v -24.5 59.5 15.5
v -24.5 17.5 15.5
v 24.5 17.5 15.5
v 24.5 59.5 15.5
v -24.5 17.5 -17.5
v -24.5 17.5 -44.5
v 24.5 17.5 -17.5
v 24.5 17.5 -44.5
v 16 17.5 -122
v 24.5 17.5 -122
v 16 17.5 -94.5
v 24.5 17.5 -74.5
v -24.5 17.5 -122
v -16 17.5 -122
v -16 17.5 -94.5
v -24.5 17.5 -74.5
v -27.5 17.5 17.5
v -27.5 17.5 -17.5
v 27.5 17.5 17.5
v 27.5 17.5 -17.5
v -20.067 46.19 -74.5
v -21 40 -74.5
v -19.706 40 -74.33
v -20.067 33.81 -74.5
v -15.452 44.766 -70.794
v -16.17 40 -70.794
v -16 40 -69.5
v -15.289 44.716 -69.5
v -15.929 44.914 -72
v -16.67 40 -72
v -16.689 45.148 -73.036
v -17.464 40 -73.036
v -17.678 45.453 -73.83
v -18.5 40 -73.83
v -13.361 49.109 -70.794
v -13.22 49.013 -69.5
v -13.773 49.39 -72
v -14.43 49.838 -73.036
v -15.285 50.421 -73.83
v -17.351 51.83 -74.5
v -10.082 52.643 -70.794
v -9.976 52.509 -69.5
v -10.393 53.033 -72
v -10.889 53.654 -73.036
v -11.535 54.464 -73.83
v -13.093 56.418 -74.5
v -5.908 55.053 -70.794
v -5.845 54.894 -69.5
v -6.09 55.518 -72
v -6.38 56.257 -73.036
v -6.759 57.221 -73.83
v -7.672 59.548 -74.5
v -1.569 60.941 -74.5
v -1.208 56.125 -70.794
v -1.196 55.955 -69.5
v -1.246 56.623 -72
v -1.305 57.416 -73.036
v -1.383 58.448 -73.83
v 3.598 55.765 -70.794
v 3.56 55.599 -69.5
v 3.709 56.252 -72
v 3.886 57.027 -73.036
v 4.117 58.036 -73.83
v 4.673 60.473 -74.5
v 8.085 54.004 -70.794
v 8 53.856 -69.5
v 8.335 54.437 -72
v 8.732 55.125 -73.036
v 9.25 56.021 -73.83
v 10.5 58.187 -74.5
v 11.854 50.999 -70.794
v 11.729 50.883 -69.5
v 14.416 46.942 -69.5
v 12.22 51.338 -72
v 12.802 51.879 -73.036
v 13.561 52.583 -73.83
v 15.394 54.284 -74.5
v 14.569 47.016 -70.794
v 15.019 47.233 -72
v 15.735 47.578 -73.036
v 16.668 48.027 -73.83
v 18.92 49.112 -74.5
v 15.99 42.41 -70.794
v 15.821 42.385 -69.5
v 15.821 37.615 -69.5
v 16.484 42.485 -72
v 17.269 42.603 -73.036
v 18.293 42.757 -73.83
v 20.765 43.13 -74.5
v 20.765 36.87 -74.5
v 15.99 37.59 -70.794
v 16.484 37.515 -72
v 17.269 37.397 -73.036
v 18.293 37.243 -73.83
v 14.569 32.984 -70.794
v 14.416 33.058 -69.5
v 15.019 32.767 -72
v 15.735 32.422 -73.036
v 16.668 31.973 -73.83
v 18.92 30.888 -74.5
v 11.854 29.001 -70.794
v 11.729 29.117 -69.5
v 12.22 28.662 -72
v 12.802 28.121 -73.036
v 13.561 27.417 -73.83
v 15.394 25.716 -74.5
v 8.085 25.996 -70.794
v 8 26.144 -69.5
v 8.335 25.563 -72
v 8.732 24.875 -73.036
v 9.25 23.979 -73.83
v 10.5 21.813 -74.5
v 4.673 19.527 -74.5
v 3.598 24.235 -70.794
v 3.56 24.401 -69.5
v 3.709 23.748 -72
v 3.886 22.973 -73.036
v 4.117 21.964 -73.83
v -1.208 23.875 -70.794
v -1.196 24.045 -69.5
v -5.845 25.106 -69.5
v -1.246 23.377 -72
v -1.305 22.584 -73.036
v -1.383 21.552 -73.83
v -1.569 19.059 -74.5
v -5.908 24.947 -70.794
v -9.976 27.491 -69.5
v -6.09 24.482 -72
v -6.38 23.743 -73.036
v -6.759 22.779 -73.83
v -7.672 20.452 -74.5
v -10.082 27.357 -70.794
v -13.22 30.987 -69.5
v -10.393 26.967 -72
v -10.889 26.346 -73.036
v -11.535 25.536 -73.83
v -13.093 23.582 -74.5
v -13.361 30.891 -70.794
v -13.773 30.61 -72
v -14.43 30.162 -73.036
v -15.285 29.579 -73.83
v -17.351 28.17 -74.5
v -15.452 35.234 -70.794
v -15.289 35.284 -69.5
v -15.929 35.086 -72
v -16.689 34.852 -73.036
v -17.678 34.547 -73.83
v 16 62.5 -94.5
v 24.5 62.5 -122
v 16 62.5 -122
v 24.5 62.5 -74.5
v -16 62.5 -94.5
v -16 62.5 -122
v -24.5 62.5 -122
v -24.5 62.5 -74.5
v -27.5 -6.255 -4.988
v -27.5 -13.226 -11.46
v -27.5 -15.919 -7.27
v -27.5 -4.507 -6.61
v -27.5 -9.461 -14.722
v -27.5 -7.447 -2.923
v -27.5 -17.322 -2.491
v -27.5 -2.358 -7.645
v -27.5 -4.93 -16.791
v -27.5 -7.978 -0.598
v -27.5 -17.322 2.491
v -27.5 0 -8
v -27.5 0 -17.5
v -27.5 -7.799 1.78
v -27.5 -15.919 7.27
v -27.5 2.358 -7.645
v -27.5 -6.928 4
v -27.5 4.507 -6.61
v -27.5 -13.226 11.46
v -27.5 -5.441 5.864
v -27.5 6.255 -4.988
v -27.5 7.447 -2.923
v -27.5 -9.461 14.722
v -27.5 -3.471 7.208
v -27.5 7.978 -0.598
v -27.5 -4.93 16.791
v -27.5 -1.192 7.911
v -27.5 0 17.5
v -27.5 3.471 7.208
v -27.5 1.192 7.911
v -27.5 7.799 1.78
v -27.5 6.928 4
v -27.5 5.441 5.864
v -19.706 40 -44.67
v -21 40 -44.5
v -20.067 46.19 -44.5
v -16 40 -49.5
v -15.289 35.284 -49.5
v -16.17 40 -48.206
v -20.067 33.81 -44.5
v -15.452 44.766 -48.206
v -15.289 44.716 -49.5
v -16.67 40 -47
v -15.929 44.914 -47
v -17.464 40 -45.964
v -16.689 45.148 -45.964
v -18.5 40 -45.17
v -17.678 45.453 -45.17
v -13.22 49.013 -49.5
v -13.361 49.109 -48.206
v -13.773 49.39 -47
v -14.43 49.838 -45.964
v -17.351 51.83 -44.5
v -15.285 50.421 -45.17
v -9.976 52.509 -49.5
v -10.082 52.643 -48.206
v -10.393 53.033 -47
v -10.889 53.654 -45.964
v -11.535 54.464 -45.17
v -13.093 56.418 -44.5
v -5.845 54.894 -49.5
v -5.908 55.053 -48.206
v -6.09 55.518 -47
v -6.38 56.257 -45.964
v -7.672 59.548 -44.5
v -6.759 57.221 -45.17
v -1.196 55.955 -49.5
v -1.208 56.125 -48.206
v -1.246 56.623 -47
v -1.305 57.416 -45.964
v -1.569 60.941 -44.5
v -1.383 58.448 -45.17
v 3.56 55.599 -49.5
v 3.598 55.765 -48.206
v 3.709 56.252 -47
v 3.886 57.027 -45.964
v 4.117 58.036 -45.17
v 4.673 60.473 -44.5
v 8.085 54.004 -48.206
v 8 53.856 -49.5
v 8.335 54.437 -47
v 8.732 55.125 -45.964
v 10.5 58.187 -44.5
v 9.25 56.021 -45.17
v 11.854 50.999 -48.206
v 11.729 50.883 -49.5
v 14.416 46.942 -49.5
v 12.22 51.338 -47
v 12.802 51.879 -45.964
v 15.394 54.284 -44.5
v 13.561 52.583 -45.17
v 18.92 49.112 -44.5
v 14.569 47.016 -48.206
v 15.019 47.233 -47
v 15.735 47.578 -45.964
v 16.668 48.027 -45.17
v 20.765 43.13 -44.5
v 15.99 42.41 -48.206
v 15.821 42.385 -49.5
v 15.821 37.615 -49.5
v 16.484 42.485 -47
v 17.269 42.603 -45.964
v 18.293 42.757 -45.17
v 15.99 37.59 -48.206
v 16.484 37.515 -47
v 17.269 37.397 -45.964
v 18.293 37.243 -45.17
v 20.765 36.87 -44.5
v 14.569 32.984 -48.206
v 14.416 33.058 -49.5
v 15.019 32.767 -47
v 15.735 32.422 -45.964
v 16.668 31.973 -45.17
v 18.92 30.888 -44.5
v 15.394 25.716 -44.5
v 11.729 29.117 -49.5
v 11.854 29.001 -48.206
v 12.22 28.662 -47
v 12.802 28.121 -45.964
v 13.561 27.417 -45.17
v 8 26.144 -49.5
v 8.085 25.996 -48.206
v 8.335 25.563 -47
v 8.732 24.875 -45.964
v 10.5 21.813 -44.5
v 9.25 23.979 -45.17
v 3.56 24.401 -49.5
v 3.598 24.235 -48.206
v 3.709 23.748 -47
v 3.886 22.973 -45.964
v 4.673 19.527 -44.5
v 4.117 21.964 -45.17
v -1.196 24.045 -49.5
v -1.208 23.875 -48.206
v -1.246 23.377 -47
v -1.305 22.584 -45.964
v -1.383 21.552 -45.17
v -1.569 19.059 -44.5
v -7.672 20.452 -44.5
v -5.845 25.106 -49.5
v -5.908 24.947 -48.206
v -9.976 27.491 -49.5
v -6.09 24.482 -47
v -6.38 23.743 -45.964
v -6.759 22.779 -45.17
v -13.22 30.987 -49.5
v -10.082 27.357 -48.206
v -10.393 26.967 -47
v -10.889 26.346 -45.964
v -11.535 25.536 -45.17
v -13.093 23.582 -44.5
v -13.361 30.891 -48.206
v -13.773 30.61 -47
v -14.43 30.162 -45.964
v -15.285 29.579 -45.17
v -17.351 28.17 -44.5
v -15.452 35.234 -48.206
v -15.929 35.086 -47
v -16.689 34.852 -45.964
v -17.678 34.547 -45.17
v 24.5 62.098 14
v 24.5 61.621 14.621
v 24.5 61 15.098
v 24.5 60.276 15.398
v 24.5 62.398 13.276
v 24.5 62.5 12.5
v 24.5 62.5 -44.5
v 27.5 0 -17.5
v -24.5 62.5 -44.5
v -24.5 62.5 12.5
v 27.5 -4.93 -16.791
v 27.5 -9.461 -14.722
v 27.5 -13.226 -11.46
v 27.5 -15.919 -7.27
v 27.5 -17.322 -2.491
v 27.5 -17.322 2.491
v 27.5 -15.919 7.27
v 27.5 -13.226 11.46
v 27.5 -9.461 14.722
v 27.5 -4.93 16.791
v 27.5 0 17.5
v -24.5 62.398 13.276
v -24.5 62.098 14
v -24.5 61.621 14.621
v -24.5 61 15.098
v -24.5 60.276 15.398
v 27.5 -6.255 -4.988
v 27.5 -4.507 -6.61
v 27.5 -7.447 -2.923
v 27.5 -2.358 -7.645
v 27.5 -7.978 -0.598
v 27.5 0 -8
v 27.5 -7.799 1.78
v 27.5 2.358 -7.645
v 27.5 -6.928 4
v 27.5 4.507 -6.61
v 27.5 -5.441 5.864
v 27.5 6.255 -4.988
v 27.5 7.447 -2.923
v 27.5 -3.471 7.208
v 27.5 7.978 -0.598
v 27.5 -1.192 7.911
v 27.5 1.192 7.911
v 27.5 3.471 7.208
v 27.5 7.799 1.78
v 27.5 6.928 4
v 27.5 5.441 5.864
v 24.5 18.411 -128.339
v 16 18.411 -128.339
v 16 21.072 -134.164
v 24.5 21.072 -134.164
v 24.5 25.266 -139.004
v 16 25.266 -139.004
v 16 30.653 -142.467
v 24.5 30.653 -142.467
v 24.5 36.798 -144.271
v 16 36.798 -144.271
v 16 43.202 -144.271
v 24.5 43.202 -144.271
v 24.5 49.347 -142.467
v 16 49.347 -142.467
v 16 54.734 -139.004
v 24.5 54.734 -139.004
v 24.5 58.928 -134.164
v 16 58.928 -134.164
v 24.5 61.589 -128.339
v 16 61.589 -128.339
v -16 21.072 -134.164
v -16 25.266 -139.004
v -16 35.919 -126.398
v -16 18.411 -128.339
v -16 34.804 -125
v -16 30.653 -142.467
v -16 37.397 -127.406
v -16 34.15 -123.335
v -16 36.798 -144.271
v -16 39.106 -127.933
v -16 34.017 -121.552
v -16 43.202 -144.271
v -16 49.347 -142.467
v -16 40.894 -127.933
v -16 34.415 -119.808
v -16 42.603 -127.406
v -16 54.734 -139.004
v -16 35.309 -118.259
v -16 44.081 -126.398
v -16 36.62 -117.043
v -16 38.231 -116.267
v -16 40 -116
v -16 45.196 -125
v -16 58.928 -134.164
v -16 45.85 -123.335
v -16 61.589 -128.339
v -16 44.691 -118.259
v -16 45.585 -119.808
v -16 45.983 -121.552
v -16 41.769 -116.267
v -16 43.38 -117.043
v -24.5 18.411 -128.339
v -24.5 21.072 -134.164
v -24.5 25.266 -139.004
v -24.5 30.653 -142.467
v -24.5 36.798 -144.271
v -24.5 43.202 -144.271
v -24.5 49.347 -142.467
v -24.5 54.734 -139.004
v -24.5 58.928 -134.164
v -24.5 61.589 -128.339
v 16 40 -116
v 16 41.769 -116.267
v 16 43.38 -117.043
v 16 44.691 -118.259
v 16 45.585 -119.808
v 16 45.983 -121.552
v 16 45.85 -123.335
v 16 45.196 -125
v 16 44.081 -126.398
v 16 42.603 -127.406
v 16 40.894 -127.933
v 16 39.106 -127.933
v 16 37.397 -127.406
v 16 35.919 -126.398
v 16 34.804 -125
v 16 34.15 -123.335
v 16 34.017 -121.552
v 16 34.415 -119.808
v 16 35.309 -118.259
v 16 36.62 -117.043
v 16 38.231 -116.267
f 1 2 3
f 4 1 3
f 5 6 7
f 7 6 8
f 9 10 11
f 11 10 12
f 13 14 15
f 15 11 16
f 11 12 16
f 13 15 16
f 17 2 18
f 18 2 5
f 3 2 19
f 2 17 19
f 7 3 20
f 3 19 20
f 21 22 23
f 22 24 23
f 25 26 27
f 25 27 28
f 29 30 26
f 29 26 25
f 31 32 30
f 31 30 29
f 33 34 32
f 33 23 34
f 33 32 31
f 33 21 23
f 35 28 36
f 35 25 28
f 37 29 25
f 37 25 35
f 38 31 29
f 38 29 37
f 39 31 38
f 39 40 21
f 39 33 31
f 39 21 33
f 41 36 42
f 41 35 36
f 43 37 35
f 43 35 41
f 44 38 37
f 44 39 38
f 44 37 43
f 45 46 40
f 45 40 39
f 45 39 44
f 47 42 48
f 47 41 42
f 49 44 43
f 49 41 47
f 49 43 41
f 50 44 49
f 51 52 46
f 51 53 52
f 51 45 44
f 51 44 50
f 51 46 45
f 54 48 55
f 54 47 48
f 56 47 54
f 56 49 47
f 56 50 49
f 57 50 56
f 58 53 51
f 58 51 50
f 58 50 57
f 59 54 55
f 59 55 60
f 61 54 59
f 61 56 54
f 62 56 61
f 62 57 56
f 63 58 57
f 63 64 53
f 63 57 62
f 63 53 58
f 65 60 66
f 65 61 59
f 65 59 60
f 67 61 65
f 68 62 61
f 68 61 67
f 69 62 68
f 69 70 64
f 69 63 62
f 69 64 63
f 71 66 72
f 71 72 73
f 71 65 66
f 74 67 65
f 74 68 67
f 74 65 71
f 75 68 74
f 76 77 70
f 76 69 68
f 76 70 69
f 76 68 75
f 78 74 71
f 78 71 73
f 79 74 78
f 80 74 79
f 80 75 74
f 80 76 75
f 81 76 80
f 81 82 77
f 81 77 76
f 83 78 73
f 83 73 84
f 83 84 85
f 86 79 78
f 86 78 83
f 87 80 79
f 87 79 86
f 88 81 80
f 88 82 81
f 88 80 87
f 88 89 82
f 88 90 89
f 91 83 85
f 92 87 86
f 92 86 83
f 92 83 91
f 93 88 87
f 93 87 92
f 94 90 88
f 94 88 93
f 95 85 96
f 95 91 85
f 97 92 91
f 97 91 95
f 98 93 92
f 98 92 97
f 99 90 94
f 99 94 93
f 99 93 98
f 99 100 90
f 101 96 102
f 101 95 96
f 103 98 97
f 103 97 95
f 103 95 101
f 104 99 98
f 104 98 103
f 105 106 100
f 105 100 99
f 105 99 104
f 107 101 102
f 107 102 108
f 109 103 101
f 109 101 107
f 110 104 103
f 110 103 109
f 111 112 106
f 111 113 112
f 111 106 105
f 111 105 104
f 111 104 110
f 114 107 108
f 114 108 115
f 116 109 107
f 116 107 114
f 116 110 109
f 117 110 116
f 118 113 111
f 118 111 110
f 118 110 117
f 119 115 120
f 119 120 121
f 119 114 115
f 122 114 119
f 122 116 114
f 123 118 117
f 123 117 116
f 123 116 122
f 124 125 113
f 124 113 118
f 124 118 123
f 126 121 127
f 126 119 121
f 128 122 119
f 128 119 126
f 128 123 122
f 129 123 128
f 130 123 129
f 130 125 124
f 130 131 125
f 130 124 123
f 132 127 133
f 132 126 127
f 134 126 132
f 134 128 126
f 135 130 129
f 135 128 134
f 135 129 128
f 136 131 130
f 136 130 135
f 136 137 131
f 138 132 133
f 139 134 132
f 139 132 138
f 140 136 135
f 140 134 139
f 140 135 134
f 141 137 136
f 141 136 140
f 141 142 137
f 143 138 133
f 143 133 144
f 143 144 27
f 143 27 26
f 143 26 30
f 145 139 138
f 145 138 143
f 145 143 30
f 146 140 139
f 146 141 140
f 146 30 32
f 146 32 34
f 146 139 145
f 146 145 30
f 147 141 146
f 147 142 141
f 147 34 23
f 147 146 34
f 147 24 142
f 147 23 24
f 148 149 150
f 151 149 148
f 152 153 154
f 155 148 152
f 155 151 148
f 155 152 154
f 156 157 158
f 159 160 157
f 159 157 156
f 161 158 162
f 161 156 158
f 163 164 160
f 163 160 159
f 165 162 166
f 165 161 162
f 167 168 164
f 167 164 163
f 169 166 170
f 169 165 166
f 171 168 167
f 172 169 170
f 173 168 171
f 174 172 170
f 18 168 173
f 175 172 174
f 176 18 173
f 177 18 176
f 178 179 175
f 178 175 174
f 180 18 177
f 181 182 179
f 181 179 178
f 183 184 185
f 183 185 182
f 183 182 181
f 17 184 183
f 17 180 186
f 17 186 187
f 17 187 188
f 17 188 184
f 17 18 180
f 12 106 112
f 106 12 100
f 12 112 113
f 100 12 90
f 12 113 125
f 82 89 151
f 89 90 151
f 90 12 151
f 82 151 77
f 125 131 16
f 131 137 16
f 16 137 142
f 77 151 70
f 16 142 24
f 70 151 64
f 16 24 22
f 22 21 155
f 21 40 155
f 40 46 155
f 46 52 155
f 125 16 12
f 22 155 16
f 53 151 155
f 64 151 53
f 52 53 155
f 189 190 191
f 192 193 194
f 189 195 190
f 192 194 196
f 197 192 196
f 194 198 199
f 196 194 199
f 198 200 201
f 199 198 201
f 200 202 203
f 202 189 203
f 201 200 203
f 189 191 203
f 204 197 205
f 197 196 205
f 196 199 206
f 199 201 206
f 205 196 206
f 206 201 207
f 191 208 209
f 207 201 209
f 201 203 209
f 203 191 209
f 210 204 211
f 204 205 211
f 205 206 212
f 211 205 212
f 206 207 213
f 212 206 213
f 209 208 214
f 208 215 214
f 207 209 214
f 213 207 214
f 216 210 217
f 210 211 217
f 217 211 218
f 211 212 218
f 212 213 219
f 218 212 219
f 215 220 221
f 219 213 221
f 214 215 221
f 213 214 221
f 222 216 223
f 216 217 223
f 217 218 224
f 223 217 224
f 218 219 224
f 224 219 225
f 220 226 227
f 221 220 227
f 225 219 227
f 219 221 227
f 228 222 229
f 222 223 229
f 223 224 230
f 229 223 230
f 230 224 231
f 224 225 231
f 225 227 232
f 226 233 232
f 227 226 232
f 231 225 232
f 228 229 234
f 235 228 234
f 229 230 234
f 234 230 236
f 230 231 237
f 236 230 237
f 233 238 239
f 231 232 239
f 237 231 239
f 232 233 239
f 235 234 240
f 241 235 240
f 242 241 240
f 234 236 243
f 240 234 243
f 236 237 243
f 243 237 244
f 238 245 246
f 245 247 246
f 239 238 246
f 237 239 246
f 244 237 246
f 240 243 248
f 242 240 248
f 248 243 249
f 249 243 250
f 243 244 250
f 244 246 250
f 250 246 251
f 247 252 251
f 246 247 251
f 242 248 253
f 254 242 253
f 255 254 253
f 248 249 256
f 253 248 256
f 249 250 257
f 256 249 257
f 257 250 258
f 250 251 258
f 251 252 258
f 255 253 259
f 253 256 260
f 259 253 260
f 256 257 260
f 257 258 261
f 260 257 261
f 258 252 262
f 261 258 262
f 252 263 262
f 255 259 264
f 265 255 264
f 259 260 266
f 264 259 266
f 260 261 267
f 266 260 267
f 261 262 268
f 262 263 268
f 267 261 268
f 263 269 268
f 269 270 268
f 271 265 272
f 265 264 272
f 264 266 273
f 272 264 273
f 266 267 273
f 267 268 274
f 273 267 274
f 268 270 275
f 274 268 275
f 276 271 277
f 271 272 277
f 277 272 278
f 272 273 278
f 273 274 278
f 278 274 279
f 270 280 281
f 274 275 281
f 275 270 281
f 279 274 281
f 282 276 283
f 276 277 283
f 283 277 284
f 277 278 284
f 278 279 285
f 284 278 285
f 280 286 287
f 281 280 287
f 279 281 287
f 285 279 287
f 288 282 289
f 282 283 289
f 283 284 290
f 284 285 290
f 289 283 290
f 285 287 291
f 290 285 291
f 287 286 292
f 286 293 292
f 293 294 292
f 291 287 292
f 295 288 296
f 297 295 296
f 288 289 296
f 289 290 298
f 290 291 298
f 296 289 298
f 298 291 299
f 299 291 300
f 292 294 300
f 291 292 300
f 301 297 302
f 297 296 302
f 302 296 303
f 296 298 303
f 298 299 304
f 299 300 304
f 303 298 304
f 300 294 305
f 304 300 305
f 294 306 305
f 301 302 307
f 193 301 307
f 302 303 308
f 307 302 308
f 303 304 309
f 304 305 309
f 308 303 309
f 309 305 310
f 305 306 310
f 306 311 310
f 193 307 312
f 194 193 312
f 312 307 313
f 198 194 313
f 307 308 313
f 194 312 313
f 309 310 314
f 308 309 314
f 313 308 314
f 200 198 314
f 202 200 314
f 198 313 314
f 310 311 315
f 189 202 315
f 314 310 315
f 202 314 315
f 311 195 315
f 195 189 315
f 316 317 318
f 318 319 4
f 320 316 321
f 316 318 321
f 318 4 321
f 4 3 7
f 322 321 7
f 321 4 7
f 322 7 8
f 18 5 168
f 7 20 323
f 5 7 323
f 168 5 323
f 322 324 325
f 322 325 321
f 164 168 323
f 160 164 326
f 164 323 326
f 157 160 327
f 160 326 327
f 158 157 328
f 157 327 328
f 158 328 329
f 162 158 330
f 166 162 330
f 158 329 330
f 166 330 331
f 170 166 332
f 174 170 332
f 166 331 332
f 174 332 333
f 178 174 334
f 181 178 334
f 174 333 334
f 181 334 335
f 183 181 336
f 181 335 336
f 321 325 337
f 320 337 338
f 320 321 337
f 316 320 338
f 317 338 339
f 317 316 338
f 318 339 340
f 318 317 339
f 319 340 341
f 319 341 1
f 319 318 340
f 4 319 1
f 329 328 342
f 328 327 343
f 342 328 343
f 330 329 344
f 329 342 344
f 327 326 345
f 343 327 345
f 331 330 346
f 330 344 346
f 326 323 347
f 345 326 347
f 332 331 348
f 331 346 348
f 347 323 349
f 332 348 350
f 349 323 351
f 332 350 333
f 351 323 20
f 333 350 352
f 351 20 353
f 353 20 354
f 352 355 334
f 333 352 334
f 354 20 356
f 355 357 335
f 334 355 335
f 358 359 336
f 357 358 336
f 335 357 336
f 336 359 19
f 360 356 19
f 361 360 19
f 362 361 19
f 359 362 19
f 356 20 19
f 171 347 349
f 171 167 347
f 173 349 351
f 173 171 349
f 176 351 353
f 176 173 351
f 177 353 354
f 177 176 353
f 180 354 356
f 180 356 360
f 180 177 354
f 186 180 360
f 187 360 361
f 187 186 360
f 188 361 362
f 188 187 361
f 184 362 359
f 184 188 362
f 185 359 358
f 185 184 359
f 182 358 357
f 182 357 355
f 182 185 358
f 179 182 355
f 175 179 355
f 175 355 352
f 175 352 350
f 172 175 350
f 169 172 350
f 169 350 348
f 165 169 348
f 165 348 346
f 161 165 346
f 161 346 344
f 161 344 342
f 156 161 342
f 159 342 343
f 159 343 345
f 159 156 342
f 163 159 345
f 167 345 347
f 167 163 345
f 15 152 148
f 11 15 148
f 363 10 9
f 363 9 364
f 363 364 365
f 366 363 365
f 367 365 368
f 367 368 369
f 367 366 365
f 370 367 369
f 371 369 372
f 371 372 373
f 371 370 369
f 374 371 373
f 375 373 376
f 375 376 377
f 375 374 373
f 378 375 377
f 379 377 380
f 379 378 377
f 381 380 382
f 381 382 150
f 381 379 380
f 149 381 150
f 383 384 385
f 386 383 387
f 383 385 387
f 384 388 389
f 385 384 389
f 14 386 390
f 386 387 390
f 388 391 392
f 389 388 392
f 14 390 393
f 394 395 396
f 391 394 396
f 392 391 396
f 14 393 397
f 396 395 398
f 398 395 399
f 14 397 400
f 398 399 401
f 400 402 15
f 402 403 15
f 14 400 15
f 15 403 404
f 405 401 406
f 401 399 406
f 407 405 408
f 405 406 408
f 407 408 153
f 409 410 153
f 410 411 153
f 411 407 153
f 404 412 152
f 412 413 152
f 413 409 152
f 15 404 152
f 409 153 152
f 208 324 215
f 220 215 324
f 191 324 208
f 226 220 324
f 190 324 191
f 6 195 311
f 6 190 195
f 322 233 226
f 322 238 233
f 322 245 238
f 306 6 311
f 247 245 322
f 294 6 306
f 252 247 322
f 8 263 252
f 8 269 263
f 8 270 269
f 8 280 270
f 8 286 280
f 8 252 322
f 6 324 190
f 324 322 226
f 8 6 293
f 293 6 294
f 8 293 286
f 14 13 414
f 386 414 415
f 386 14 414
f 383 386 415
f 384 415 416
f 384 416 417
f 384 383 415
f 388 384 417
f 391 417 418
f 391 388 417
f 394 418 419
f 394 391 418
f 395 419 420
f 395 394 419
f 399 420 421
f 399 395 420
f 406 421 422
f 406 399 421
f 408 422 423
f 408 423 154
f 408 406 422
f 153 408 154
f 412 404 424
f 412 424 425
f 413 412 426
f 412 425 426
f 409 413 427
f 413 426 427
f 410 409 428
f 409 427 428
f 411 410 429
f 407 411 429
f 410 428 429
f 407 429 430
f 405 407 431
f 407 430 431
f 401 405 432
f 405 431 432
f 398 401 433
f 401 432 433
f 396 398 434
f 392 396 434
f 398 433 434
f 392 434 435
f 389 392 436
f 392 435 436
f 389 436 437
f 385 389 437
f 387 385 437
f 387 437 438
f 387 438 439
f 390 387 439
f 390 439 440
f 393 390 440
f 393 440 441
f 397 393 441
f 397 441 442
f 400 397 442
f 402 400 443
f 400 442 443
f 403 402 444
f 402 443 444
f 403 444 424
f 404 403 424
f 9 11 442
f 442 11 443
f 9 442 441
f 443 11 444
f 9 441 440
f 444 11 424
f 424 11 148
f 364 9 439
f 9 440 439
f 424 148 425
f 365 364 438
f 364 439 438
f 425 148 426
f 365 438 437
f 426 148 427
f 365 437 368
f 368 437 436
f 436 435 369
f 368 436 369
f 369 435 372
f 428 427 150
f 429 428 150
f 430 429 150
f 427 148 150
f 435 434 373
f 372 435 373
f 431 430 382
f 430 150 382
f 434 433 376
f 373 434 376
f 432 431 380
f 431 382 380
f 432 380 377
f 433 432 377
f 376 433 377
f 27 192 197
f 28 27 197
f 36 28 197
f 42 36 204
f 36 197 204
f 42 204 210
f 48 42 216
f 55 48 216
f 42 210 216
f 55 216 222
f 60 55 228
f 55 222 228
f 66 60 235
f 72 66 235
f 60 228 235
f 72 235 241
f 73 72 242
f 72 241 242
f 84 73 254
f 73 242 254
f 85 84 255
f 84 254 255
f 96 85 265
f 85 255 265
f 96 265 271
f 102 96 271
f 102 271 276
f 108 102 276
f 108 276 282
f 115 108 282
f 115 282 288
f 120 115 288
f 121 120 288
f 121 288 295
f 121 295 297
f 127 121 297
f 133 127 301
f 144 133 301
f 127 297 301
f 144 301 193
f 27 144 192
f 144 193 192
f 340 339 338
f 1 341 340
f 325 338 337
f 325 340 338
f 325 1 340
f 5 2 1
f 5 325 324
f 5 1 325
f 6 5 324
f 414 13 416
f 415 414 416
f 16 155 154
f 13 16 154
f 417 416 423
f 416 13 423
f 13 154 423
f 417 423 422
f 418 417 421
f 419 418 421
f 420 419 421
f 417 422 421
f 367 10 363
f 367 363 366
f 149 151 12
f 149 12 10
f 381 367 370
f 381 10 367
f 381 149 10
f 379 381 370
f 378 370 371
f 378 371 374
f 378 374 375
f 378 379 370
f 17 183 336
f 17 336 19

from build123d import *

# Parameters (mm, degrees)
SKETCH1_R           = 8
BOSS_EXTRUDE1_DEPTH = 27.5
SKETCH2_W           = 49
SKETCH2_H           = 60
BOSS_EXTRUDE2_DEPTH = 45
SKETCH3_R           = 16
BOSS_EXTRUDE3_DEPTH = 30
SKETCH4_W           = 49
SKETCH4_H           = 45
BOSS_EXTRUDE4_DEPTH = 47.5
BOSS_EXTRUDE5_DEPTH = 49
SKETCH6_W           = 24.794244746
SKETCH6_H           = 50
CUT_EXTRUDE1_DEPTH  = 81
SKETCH7_R           = 6
CUT_EXTRUDE2_DEPTH  = 53
SKETCH8_R           = 6
BOSS_EXTRUDE6_DEPTH = 49
FILLET1_R           = 5
FILLET2_R           = 5
FILLET4_R           = 3
CUT_EXTRUDE4_DEPTH  = 81
SKETCH12_R          = 6
BOSS_EXTRUDE7_DEPTH = 32


with BuildPart() as part:
    # Sketch1 → Boss-Extrude1 (new body, symmetric)
    with BuildSketch(Plane(origin=(0, 0, 0), x_dir=(0, 0, -1), z_dir=(1, 0, 0))):
        with BuildLine():
            Line((-17.5, 0), (-17.5, 17.5))
            Line((-17.5, 17.5), (17.5, 17.5))
            Line((17.5, 17.5), (17.5, 0))
            ThreePointArc((17.5, 0), (0, -17.5), (-17.5, 0))
        make_face()
        Circle(SKETCH1_R, mode=Mode.SUBTRACT)
    extrude(amount=BOSS_EXTRUDE1_DEPTH, both=True)

    # Sketch2 → Boss-Extrude2 (add)
    with BuildSketch(Plane(origin=(0, 17.5, 0), x_dir=(1, 0, 0), z_dir=(0, 1, 0))):
        with Locations((0, 14.5)):
            Rectangle(SKETCH2_W, SKETCH2_H)
    extrude(amount=BOSS_EXTRUDE2_DEPTH)

    # Sketch3 → Boss-Extrude3 (add)
    with BuildSketch(Plane(origin=(0, 0, -44.5), x_dir=(-1, 0, 0), z_dir=(0, 0, -1))):
        with Locations((0, 40)):
            Circle(SKETCH3_R)
    extrude(amount=BOSS_EXTRUDE3_DEPTH)

    # Sketch4 → Boss-Extrude4 (add)
    with BuildSketch(Plane(origin=(0, 0, -74.5), x_dir=(-1, 0, 0), z_dir=(0, 0, -1))):
        with Locations((0, 40)):
            Rectangle(SKETCH4_W, SKETCH4_H)
    extrude(amount=BOSS_EXTRUDE4_DEPTH)

    # Sketch5 → Boss-Extrude5 (add)
    with BuildSketch(Plane(origin=(24.5, 0, 0), x_dir=(0, 0, -1), z_dir=(1, 0, 0))):
        with BuildLine():
            Line((122, 62.5), (122, 17.5))
            ThreePointArc((122, 17.5), (144.5, 40), (122, 62.5))
        make_face()
    extrude(amount=-BOSS_EXTRUDE5_DEPTH)

    # Sketch6 → Cut-Extrude1 (cut, through all)
    with BuildSketch(Plane(origin=(0, 62.5, 0), x_dir=(1, 0, 0), z_dir=(0, 1, 0))):
        with Locations((0, 119.5)):
            Rectangle(SKETCH6_W, SKETCH6_H)
    extrude(amount=-CUT_EXTRUDE1_DEPTH, mode=Mode.SUBTRACT)

    # Sketch7 → Cut-Extrude2 (cut, through all)
    with BuildSketch(Plane(origin=(24.5, 0, 0), x_dir=(0, 0, -1), z_dir=(1, 0, 0))):
        with Locations((122, 40)):
            Circle(SKETCH7_R)
    extrude(amount=-CUT_EXTRUDE2_DEPTH, mode=Mode.SUBTRACT)

    # Sketch8 → Boss-Extrude6 (add)
    with BuildSketch(Plane(origin=(24.5, 0, 0), x_dir=(0, 0, -1), z_dir=(1, 0, 0))):
        with Locations((122, 40)):
            Circle(SKETCH8_R)
    extrude(amount=-BOSS_EXTRUDE6_DEPTH)

    # Fillet1
    fillet1_edges = [part.edges().sort_by_distance(p)[0] for p in [
        (16, 40, -44.5),
    ]]
    fillet(fillet1_edges, radius=FILLET1_R)

    # Fillet2
    fillet2_edges = [part.edges().sort_by_distance(p)[0] for p in [
        (16, 40, -74.5),
    ]]
    fillet(fillet2_edges, radius=FILLET2_R)

    # Fillet4
    fillet4_edges = [part.edges().sort_by_distance(p)[0] for p in [
        (0, 62.5, 15.5),
    ]]
    fillet(fillet4_edges, radius=FILLET4_R)

    # Sketch10 → Cut-Extrude4 (cut, through all)
    with BuildSketch(Plane(origin=(0, 62.5, 0), x_dir=(1, 0, 0), z_dir=(0, 1, 0))):
        Polygon((16, 94.5), (16, 144.5), (-16, 144.5), (-16, 97.685176626), (-16, 94.5), align=None)
    extrude(amount=-CUT_EXTRUDE4_DEPTH, mode=Mode.SUBTRACT)

    # Sketch12 → Boss-Extrude7 (add)
    with BuildSketch(Plane.ZY.offset(-16)):
        with Locations((-122, 40)):
            Circle(SKETCH12_R)
    extrude(amount=BOSS_EXTRUDE7_DEPTH)


solid = part.part
